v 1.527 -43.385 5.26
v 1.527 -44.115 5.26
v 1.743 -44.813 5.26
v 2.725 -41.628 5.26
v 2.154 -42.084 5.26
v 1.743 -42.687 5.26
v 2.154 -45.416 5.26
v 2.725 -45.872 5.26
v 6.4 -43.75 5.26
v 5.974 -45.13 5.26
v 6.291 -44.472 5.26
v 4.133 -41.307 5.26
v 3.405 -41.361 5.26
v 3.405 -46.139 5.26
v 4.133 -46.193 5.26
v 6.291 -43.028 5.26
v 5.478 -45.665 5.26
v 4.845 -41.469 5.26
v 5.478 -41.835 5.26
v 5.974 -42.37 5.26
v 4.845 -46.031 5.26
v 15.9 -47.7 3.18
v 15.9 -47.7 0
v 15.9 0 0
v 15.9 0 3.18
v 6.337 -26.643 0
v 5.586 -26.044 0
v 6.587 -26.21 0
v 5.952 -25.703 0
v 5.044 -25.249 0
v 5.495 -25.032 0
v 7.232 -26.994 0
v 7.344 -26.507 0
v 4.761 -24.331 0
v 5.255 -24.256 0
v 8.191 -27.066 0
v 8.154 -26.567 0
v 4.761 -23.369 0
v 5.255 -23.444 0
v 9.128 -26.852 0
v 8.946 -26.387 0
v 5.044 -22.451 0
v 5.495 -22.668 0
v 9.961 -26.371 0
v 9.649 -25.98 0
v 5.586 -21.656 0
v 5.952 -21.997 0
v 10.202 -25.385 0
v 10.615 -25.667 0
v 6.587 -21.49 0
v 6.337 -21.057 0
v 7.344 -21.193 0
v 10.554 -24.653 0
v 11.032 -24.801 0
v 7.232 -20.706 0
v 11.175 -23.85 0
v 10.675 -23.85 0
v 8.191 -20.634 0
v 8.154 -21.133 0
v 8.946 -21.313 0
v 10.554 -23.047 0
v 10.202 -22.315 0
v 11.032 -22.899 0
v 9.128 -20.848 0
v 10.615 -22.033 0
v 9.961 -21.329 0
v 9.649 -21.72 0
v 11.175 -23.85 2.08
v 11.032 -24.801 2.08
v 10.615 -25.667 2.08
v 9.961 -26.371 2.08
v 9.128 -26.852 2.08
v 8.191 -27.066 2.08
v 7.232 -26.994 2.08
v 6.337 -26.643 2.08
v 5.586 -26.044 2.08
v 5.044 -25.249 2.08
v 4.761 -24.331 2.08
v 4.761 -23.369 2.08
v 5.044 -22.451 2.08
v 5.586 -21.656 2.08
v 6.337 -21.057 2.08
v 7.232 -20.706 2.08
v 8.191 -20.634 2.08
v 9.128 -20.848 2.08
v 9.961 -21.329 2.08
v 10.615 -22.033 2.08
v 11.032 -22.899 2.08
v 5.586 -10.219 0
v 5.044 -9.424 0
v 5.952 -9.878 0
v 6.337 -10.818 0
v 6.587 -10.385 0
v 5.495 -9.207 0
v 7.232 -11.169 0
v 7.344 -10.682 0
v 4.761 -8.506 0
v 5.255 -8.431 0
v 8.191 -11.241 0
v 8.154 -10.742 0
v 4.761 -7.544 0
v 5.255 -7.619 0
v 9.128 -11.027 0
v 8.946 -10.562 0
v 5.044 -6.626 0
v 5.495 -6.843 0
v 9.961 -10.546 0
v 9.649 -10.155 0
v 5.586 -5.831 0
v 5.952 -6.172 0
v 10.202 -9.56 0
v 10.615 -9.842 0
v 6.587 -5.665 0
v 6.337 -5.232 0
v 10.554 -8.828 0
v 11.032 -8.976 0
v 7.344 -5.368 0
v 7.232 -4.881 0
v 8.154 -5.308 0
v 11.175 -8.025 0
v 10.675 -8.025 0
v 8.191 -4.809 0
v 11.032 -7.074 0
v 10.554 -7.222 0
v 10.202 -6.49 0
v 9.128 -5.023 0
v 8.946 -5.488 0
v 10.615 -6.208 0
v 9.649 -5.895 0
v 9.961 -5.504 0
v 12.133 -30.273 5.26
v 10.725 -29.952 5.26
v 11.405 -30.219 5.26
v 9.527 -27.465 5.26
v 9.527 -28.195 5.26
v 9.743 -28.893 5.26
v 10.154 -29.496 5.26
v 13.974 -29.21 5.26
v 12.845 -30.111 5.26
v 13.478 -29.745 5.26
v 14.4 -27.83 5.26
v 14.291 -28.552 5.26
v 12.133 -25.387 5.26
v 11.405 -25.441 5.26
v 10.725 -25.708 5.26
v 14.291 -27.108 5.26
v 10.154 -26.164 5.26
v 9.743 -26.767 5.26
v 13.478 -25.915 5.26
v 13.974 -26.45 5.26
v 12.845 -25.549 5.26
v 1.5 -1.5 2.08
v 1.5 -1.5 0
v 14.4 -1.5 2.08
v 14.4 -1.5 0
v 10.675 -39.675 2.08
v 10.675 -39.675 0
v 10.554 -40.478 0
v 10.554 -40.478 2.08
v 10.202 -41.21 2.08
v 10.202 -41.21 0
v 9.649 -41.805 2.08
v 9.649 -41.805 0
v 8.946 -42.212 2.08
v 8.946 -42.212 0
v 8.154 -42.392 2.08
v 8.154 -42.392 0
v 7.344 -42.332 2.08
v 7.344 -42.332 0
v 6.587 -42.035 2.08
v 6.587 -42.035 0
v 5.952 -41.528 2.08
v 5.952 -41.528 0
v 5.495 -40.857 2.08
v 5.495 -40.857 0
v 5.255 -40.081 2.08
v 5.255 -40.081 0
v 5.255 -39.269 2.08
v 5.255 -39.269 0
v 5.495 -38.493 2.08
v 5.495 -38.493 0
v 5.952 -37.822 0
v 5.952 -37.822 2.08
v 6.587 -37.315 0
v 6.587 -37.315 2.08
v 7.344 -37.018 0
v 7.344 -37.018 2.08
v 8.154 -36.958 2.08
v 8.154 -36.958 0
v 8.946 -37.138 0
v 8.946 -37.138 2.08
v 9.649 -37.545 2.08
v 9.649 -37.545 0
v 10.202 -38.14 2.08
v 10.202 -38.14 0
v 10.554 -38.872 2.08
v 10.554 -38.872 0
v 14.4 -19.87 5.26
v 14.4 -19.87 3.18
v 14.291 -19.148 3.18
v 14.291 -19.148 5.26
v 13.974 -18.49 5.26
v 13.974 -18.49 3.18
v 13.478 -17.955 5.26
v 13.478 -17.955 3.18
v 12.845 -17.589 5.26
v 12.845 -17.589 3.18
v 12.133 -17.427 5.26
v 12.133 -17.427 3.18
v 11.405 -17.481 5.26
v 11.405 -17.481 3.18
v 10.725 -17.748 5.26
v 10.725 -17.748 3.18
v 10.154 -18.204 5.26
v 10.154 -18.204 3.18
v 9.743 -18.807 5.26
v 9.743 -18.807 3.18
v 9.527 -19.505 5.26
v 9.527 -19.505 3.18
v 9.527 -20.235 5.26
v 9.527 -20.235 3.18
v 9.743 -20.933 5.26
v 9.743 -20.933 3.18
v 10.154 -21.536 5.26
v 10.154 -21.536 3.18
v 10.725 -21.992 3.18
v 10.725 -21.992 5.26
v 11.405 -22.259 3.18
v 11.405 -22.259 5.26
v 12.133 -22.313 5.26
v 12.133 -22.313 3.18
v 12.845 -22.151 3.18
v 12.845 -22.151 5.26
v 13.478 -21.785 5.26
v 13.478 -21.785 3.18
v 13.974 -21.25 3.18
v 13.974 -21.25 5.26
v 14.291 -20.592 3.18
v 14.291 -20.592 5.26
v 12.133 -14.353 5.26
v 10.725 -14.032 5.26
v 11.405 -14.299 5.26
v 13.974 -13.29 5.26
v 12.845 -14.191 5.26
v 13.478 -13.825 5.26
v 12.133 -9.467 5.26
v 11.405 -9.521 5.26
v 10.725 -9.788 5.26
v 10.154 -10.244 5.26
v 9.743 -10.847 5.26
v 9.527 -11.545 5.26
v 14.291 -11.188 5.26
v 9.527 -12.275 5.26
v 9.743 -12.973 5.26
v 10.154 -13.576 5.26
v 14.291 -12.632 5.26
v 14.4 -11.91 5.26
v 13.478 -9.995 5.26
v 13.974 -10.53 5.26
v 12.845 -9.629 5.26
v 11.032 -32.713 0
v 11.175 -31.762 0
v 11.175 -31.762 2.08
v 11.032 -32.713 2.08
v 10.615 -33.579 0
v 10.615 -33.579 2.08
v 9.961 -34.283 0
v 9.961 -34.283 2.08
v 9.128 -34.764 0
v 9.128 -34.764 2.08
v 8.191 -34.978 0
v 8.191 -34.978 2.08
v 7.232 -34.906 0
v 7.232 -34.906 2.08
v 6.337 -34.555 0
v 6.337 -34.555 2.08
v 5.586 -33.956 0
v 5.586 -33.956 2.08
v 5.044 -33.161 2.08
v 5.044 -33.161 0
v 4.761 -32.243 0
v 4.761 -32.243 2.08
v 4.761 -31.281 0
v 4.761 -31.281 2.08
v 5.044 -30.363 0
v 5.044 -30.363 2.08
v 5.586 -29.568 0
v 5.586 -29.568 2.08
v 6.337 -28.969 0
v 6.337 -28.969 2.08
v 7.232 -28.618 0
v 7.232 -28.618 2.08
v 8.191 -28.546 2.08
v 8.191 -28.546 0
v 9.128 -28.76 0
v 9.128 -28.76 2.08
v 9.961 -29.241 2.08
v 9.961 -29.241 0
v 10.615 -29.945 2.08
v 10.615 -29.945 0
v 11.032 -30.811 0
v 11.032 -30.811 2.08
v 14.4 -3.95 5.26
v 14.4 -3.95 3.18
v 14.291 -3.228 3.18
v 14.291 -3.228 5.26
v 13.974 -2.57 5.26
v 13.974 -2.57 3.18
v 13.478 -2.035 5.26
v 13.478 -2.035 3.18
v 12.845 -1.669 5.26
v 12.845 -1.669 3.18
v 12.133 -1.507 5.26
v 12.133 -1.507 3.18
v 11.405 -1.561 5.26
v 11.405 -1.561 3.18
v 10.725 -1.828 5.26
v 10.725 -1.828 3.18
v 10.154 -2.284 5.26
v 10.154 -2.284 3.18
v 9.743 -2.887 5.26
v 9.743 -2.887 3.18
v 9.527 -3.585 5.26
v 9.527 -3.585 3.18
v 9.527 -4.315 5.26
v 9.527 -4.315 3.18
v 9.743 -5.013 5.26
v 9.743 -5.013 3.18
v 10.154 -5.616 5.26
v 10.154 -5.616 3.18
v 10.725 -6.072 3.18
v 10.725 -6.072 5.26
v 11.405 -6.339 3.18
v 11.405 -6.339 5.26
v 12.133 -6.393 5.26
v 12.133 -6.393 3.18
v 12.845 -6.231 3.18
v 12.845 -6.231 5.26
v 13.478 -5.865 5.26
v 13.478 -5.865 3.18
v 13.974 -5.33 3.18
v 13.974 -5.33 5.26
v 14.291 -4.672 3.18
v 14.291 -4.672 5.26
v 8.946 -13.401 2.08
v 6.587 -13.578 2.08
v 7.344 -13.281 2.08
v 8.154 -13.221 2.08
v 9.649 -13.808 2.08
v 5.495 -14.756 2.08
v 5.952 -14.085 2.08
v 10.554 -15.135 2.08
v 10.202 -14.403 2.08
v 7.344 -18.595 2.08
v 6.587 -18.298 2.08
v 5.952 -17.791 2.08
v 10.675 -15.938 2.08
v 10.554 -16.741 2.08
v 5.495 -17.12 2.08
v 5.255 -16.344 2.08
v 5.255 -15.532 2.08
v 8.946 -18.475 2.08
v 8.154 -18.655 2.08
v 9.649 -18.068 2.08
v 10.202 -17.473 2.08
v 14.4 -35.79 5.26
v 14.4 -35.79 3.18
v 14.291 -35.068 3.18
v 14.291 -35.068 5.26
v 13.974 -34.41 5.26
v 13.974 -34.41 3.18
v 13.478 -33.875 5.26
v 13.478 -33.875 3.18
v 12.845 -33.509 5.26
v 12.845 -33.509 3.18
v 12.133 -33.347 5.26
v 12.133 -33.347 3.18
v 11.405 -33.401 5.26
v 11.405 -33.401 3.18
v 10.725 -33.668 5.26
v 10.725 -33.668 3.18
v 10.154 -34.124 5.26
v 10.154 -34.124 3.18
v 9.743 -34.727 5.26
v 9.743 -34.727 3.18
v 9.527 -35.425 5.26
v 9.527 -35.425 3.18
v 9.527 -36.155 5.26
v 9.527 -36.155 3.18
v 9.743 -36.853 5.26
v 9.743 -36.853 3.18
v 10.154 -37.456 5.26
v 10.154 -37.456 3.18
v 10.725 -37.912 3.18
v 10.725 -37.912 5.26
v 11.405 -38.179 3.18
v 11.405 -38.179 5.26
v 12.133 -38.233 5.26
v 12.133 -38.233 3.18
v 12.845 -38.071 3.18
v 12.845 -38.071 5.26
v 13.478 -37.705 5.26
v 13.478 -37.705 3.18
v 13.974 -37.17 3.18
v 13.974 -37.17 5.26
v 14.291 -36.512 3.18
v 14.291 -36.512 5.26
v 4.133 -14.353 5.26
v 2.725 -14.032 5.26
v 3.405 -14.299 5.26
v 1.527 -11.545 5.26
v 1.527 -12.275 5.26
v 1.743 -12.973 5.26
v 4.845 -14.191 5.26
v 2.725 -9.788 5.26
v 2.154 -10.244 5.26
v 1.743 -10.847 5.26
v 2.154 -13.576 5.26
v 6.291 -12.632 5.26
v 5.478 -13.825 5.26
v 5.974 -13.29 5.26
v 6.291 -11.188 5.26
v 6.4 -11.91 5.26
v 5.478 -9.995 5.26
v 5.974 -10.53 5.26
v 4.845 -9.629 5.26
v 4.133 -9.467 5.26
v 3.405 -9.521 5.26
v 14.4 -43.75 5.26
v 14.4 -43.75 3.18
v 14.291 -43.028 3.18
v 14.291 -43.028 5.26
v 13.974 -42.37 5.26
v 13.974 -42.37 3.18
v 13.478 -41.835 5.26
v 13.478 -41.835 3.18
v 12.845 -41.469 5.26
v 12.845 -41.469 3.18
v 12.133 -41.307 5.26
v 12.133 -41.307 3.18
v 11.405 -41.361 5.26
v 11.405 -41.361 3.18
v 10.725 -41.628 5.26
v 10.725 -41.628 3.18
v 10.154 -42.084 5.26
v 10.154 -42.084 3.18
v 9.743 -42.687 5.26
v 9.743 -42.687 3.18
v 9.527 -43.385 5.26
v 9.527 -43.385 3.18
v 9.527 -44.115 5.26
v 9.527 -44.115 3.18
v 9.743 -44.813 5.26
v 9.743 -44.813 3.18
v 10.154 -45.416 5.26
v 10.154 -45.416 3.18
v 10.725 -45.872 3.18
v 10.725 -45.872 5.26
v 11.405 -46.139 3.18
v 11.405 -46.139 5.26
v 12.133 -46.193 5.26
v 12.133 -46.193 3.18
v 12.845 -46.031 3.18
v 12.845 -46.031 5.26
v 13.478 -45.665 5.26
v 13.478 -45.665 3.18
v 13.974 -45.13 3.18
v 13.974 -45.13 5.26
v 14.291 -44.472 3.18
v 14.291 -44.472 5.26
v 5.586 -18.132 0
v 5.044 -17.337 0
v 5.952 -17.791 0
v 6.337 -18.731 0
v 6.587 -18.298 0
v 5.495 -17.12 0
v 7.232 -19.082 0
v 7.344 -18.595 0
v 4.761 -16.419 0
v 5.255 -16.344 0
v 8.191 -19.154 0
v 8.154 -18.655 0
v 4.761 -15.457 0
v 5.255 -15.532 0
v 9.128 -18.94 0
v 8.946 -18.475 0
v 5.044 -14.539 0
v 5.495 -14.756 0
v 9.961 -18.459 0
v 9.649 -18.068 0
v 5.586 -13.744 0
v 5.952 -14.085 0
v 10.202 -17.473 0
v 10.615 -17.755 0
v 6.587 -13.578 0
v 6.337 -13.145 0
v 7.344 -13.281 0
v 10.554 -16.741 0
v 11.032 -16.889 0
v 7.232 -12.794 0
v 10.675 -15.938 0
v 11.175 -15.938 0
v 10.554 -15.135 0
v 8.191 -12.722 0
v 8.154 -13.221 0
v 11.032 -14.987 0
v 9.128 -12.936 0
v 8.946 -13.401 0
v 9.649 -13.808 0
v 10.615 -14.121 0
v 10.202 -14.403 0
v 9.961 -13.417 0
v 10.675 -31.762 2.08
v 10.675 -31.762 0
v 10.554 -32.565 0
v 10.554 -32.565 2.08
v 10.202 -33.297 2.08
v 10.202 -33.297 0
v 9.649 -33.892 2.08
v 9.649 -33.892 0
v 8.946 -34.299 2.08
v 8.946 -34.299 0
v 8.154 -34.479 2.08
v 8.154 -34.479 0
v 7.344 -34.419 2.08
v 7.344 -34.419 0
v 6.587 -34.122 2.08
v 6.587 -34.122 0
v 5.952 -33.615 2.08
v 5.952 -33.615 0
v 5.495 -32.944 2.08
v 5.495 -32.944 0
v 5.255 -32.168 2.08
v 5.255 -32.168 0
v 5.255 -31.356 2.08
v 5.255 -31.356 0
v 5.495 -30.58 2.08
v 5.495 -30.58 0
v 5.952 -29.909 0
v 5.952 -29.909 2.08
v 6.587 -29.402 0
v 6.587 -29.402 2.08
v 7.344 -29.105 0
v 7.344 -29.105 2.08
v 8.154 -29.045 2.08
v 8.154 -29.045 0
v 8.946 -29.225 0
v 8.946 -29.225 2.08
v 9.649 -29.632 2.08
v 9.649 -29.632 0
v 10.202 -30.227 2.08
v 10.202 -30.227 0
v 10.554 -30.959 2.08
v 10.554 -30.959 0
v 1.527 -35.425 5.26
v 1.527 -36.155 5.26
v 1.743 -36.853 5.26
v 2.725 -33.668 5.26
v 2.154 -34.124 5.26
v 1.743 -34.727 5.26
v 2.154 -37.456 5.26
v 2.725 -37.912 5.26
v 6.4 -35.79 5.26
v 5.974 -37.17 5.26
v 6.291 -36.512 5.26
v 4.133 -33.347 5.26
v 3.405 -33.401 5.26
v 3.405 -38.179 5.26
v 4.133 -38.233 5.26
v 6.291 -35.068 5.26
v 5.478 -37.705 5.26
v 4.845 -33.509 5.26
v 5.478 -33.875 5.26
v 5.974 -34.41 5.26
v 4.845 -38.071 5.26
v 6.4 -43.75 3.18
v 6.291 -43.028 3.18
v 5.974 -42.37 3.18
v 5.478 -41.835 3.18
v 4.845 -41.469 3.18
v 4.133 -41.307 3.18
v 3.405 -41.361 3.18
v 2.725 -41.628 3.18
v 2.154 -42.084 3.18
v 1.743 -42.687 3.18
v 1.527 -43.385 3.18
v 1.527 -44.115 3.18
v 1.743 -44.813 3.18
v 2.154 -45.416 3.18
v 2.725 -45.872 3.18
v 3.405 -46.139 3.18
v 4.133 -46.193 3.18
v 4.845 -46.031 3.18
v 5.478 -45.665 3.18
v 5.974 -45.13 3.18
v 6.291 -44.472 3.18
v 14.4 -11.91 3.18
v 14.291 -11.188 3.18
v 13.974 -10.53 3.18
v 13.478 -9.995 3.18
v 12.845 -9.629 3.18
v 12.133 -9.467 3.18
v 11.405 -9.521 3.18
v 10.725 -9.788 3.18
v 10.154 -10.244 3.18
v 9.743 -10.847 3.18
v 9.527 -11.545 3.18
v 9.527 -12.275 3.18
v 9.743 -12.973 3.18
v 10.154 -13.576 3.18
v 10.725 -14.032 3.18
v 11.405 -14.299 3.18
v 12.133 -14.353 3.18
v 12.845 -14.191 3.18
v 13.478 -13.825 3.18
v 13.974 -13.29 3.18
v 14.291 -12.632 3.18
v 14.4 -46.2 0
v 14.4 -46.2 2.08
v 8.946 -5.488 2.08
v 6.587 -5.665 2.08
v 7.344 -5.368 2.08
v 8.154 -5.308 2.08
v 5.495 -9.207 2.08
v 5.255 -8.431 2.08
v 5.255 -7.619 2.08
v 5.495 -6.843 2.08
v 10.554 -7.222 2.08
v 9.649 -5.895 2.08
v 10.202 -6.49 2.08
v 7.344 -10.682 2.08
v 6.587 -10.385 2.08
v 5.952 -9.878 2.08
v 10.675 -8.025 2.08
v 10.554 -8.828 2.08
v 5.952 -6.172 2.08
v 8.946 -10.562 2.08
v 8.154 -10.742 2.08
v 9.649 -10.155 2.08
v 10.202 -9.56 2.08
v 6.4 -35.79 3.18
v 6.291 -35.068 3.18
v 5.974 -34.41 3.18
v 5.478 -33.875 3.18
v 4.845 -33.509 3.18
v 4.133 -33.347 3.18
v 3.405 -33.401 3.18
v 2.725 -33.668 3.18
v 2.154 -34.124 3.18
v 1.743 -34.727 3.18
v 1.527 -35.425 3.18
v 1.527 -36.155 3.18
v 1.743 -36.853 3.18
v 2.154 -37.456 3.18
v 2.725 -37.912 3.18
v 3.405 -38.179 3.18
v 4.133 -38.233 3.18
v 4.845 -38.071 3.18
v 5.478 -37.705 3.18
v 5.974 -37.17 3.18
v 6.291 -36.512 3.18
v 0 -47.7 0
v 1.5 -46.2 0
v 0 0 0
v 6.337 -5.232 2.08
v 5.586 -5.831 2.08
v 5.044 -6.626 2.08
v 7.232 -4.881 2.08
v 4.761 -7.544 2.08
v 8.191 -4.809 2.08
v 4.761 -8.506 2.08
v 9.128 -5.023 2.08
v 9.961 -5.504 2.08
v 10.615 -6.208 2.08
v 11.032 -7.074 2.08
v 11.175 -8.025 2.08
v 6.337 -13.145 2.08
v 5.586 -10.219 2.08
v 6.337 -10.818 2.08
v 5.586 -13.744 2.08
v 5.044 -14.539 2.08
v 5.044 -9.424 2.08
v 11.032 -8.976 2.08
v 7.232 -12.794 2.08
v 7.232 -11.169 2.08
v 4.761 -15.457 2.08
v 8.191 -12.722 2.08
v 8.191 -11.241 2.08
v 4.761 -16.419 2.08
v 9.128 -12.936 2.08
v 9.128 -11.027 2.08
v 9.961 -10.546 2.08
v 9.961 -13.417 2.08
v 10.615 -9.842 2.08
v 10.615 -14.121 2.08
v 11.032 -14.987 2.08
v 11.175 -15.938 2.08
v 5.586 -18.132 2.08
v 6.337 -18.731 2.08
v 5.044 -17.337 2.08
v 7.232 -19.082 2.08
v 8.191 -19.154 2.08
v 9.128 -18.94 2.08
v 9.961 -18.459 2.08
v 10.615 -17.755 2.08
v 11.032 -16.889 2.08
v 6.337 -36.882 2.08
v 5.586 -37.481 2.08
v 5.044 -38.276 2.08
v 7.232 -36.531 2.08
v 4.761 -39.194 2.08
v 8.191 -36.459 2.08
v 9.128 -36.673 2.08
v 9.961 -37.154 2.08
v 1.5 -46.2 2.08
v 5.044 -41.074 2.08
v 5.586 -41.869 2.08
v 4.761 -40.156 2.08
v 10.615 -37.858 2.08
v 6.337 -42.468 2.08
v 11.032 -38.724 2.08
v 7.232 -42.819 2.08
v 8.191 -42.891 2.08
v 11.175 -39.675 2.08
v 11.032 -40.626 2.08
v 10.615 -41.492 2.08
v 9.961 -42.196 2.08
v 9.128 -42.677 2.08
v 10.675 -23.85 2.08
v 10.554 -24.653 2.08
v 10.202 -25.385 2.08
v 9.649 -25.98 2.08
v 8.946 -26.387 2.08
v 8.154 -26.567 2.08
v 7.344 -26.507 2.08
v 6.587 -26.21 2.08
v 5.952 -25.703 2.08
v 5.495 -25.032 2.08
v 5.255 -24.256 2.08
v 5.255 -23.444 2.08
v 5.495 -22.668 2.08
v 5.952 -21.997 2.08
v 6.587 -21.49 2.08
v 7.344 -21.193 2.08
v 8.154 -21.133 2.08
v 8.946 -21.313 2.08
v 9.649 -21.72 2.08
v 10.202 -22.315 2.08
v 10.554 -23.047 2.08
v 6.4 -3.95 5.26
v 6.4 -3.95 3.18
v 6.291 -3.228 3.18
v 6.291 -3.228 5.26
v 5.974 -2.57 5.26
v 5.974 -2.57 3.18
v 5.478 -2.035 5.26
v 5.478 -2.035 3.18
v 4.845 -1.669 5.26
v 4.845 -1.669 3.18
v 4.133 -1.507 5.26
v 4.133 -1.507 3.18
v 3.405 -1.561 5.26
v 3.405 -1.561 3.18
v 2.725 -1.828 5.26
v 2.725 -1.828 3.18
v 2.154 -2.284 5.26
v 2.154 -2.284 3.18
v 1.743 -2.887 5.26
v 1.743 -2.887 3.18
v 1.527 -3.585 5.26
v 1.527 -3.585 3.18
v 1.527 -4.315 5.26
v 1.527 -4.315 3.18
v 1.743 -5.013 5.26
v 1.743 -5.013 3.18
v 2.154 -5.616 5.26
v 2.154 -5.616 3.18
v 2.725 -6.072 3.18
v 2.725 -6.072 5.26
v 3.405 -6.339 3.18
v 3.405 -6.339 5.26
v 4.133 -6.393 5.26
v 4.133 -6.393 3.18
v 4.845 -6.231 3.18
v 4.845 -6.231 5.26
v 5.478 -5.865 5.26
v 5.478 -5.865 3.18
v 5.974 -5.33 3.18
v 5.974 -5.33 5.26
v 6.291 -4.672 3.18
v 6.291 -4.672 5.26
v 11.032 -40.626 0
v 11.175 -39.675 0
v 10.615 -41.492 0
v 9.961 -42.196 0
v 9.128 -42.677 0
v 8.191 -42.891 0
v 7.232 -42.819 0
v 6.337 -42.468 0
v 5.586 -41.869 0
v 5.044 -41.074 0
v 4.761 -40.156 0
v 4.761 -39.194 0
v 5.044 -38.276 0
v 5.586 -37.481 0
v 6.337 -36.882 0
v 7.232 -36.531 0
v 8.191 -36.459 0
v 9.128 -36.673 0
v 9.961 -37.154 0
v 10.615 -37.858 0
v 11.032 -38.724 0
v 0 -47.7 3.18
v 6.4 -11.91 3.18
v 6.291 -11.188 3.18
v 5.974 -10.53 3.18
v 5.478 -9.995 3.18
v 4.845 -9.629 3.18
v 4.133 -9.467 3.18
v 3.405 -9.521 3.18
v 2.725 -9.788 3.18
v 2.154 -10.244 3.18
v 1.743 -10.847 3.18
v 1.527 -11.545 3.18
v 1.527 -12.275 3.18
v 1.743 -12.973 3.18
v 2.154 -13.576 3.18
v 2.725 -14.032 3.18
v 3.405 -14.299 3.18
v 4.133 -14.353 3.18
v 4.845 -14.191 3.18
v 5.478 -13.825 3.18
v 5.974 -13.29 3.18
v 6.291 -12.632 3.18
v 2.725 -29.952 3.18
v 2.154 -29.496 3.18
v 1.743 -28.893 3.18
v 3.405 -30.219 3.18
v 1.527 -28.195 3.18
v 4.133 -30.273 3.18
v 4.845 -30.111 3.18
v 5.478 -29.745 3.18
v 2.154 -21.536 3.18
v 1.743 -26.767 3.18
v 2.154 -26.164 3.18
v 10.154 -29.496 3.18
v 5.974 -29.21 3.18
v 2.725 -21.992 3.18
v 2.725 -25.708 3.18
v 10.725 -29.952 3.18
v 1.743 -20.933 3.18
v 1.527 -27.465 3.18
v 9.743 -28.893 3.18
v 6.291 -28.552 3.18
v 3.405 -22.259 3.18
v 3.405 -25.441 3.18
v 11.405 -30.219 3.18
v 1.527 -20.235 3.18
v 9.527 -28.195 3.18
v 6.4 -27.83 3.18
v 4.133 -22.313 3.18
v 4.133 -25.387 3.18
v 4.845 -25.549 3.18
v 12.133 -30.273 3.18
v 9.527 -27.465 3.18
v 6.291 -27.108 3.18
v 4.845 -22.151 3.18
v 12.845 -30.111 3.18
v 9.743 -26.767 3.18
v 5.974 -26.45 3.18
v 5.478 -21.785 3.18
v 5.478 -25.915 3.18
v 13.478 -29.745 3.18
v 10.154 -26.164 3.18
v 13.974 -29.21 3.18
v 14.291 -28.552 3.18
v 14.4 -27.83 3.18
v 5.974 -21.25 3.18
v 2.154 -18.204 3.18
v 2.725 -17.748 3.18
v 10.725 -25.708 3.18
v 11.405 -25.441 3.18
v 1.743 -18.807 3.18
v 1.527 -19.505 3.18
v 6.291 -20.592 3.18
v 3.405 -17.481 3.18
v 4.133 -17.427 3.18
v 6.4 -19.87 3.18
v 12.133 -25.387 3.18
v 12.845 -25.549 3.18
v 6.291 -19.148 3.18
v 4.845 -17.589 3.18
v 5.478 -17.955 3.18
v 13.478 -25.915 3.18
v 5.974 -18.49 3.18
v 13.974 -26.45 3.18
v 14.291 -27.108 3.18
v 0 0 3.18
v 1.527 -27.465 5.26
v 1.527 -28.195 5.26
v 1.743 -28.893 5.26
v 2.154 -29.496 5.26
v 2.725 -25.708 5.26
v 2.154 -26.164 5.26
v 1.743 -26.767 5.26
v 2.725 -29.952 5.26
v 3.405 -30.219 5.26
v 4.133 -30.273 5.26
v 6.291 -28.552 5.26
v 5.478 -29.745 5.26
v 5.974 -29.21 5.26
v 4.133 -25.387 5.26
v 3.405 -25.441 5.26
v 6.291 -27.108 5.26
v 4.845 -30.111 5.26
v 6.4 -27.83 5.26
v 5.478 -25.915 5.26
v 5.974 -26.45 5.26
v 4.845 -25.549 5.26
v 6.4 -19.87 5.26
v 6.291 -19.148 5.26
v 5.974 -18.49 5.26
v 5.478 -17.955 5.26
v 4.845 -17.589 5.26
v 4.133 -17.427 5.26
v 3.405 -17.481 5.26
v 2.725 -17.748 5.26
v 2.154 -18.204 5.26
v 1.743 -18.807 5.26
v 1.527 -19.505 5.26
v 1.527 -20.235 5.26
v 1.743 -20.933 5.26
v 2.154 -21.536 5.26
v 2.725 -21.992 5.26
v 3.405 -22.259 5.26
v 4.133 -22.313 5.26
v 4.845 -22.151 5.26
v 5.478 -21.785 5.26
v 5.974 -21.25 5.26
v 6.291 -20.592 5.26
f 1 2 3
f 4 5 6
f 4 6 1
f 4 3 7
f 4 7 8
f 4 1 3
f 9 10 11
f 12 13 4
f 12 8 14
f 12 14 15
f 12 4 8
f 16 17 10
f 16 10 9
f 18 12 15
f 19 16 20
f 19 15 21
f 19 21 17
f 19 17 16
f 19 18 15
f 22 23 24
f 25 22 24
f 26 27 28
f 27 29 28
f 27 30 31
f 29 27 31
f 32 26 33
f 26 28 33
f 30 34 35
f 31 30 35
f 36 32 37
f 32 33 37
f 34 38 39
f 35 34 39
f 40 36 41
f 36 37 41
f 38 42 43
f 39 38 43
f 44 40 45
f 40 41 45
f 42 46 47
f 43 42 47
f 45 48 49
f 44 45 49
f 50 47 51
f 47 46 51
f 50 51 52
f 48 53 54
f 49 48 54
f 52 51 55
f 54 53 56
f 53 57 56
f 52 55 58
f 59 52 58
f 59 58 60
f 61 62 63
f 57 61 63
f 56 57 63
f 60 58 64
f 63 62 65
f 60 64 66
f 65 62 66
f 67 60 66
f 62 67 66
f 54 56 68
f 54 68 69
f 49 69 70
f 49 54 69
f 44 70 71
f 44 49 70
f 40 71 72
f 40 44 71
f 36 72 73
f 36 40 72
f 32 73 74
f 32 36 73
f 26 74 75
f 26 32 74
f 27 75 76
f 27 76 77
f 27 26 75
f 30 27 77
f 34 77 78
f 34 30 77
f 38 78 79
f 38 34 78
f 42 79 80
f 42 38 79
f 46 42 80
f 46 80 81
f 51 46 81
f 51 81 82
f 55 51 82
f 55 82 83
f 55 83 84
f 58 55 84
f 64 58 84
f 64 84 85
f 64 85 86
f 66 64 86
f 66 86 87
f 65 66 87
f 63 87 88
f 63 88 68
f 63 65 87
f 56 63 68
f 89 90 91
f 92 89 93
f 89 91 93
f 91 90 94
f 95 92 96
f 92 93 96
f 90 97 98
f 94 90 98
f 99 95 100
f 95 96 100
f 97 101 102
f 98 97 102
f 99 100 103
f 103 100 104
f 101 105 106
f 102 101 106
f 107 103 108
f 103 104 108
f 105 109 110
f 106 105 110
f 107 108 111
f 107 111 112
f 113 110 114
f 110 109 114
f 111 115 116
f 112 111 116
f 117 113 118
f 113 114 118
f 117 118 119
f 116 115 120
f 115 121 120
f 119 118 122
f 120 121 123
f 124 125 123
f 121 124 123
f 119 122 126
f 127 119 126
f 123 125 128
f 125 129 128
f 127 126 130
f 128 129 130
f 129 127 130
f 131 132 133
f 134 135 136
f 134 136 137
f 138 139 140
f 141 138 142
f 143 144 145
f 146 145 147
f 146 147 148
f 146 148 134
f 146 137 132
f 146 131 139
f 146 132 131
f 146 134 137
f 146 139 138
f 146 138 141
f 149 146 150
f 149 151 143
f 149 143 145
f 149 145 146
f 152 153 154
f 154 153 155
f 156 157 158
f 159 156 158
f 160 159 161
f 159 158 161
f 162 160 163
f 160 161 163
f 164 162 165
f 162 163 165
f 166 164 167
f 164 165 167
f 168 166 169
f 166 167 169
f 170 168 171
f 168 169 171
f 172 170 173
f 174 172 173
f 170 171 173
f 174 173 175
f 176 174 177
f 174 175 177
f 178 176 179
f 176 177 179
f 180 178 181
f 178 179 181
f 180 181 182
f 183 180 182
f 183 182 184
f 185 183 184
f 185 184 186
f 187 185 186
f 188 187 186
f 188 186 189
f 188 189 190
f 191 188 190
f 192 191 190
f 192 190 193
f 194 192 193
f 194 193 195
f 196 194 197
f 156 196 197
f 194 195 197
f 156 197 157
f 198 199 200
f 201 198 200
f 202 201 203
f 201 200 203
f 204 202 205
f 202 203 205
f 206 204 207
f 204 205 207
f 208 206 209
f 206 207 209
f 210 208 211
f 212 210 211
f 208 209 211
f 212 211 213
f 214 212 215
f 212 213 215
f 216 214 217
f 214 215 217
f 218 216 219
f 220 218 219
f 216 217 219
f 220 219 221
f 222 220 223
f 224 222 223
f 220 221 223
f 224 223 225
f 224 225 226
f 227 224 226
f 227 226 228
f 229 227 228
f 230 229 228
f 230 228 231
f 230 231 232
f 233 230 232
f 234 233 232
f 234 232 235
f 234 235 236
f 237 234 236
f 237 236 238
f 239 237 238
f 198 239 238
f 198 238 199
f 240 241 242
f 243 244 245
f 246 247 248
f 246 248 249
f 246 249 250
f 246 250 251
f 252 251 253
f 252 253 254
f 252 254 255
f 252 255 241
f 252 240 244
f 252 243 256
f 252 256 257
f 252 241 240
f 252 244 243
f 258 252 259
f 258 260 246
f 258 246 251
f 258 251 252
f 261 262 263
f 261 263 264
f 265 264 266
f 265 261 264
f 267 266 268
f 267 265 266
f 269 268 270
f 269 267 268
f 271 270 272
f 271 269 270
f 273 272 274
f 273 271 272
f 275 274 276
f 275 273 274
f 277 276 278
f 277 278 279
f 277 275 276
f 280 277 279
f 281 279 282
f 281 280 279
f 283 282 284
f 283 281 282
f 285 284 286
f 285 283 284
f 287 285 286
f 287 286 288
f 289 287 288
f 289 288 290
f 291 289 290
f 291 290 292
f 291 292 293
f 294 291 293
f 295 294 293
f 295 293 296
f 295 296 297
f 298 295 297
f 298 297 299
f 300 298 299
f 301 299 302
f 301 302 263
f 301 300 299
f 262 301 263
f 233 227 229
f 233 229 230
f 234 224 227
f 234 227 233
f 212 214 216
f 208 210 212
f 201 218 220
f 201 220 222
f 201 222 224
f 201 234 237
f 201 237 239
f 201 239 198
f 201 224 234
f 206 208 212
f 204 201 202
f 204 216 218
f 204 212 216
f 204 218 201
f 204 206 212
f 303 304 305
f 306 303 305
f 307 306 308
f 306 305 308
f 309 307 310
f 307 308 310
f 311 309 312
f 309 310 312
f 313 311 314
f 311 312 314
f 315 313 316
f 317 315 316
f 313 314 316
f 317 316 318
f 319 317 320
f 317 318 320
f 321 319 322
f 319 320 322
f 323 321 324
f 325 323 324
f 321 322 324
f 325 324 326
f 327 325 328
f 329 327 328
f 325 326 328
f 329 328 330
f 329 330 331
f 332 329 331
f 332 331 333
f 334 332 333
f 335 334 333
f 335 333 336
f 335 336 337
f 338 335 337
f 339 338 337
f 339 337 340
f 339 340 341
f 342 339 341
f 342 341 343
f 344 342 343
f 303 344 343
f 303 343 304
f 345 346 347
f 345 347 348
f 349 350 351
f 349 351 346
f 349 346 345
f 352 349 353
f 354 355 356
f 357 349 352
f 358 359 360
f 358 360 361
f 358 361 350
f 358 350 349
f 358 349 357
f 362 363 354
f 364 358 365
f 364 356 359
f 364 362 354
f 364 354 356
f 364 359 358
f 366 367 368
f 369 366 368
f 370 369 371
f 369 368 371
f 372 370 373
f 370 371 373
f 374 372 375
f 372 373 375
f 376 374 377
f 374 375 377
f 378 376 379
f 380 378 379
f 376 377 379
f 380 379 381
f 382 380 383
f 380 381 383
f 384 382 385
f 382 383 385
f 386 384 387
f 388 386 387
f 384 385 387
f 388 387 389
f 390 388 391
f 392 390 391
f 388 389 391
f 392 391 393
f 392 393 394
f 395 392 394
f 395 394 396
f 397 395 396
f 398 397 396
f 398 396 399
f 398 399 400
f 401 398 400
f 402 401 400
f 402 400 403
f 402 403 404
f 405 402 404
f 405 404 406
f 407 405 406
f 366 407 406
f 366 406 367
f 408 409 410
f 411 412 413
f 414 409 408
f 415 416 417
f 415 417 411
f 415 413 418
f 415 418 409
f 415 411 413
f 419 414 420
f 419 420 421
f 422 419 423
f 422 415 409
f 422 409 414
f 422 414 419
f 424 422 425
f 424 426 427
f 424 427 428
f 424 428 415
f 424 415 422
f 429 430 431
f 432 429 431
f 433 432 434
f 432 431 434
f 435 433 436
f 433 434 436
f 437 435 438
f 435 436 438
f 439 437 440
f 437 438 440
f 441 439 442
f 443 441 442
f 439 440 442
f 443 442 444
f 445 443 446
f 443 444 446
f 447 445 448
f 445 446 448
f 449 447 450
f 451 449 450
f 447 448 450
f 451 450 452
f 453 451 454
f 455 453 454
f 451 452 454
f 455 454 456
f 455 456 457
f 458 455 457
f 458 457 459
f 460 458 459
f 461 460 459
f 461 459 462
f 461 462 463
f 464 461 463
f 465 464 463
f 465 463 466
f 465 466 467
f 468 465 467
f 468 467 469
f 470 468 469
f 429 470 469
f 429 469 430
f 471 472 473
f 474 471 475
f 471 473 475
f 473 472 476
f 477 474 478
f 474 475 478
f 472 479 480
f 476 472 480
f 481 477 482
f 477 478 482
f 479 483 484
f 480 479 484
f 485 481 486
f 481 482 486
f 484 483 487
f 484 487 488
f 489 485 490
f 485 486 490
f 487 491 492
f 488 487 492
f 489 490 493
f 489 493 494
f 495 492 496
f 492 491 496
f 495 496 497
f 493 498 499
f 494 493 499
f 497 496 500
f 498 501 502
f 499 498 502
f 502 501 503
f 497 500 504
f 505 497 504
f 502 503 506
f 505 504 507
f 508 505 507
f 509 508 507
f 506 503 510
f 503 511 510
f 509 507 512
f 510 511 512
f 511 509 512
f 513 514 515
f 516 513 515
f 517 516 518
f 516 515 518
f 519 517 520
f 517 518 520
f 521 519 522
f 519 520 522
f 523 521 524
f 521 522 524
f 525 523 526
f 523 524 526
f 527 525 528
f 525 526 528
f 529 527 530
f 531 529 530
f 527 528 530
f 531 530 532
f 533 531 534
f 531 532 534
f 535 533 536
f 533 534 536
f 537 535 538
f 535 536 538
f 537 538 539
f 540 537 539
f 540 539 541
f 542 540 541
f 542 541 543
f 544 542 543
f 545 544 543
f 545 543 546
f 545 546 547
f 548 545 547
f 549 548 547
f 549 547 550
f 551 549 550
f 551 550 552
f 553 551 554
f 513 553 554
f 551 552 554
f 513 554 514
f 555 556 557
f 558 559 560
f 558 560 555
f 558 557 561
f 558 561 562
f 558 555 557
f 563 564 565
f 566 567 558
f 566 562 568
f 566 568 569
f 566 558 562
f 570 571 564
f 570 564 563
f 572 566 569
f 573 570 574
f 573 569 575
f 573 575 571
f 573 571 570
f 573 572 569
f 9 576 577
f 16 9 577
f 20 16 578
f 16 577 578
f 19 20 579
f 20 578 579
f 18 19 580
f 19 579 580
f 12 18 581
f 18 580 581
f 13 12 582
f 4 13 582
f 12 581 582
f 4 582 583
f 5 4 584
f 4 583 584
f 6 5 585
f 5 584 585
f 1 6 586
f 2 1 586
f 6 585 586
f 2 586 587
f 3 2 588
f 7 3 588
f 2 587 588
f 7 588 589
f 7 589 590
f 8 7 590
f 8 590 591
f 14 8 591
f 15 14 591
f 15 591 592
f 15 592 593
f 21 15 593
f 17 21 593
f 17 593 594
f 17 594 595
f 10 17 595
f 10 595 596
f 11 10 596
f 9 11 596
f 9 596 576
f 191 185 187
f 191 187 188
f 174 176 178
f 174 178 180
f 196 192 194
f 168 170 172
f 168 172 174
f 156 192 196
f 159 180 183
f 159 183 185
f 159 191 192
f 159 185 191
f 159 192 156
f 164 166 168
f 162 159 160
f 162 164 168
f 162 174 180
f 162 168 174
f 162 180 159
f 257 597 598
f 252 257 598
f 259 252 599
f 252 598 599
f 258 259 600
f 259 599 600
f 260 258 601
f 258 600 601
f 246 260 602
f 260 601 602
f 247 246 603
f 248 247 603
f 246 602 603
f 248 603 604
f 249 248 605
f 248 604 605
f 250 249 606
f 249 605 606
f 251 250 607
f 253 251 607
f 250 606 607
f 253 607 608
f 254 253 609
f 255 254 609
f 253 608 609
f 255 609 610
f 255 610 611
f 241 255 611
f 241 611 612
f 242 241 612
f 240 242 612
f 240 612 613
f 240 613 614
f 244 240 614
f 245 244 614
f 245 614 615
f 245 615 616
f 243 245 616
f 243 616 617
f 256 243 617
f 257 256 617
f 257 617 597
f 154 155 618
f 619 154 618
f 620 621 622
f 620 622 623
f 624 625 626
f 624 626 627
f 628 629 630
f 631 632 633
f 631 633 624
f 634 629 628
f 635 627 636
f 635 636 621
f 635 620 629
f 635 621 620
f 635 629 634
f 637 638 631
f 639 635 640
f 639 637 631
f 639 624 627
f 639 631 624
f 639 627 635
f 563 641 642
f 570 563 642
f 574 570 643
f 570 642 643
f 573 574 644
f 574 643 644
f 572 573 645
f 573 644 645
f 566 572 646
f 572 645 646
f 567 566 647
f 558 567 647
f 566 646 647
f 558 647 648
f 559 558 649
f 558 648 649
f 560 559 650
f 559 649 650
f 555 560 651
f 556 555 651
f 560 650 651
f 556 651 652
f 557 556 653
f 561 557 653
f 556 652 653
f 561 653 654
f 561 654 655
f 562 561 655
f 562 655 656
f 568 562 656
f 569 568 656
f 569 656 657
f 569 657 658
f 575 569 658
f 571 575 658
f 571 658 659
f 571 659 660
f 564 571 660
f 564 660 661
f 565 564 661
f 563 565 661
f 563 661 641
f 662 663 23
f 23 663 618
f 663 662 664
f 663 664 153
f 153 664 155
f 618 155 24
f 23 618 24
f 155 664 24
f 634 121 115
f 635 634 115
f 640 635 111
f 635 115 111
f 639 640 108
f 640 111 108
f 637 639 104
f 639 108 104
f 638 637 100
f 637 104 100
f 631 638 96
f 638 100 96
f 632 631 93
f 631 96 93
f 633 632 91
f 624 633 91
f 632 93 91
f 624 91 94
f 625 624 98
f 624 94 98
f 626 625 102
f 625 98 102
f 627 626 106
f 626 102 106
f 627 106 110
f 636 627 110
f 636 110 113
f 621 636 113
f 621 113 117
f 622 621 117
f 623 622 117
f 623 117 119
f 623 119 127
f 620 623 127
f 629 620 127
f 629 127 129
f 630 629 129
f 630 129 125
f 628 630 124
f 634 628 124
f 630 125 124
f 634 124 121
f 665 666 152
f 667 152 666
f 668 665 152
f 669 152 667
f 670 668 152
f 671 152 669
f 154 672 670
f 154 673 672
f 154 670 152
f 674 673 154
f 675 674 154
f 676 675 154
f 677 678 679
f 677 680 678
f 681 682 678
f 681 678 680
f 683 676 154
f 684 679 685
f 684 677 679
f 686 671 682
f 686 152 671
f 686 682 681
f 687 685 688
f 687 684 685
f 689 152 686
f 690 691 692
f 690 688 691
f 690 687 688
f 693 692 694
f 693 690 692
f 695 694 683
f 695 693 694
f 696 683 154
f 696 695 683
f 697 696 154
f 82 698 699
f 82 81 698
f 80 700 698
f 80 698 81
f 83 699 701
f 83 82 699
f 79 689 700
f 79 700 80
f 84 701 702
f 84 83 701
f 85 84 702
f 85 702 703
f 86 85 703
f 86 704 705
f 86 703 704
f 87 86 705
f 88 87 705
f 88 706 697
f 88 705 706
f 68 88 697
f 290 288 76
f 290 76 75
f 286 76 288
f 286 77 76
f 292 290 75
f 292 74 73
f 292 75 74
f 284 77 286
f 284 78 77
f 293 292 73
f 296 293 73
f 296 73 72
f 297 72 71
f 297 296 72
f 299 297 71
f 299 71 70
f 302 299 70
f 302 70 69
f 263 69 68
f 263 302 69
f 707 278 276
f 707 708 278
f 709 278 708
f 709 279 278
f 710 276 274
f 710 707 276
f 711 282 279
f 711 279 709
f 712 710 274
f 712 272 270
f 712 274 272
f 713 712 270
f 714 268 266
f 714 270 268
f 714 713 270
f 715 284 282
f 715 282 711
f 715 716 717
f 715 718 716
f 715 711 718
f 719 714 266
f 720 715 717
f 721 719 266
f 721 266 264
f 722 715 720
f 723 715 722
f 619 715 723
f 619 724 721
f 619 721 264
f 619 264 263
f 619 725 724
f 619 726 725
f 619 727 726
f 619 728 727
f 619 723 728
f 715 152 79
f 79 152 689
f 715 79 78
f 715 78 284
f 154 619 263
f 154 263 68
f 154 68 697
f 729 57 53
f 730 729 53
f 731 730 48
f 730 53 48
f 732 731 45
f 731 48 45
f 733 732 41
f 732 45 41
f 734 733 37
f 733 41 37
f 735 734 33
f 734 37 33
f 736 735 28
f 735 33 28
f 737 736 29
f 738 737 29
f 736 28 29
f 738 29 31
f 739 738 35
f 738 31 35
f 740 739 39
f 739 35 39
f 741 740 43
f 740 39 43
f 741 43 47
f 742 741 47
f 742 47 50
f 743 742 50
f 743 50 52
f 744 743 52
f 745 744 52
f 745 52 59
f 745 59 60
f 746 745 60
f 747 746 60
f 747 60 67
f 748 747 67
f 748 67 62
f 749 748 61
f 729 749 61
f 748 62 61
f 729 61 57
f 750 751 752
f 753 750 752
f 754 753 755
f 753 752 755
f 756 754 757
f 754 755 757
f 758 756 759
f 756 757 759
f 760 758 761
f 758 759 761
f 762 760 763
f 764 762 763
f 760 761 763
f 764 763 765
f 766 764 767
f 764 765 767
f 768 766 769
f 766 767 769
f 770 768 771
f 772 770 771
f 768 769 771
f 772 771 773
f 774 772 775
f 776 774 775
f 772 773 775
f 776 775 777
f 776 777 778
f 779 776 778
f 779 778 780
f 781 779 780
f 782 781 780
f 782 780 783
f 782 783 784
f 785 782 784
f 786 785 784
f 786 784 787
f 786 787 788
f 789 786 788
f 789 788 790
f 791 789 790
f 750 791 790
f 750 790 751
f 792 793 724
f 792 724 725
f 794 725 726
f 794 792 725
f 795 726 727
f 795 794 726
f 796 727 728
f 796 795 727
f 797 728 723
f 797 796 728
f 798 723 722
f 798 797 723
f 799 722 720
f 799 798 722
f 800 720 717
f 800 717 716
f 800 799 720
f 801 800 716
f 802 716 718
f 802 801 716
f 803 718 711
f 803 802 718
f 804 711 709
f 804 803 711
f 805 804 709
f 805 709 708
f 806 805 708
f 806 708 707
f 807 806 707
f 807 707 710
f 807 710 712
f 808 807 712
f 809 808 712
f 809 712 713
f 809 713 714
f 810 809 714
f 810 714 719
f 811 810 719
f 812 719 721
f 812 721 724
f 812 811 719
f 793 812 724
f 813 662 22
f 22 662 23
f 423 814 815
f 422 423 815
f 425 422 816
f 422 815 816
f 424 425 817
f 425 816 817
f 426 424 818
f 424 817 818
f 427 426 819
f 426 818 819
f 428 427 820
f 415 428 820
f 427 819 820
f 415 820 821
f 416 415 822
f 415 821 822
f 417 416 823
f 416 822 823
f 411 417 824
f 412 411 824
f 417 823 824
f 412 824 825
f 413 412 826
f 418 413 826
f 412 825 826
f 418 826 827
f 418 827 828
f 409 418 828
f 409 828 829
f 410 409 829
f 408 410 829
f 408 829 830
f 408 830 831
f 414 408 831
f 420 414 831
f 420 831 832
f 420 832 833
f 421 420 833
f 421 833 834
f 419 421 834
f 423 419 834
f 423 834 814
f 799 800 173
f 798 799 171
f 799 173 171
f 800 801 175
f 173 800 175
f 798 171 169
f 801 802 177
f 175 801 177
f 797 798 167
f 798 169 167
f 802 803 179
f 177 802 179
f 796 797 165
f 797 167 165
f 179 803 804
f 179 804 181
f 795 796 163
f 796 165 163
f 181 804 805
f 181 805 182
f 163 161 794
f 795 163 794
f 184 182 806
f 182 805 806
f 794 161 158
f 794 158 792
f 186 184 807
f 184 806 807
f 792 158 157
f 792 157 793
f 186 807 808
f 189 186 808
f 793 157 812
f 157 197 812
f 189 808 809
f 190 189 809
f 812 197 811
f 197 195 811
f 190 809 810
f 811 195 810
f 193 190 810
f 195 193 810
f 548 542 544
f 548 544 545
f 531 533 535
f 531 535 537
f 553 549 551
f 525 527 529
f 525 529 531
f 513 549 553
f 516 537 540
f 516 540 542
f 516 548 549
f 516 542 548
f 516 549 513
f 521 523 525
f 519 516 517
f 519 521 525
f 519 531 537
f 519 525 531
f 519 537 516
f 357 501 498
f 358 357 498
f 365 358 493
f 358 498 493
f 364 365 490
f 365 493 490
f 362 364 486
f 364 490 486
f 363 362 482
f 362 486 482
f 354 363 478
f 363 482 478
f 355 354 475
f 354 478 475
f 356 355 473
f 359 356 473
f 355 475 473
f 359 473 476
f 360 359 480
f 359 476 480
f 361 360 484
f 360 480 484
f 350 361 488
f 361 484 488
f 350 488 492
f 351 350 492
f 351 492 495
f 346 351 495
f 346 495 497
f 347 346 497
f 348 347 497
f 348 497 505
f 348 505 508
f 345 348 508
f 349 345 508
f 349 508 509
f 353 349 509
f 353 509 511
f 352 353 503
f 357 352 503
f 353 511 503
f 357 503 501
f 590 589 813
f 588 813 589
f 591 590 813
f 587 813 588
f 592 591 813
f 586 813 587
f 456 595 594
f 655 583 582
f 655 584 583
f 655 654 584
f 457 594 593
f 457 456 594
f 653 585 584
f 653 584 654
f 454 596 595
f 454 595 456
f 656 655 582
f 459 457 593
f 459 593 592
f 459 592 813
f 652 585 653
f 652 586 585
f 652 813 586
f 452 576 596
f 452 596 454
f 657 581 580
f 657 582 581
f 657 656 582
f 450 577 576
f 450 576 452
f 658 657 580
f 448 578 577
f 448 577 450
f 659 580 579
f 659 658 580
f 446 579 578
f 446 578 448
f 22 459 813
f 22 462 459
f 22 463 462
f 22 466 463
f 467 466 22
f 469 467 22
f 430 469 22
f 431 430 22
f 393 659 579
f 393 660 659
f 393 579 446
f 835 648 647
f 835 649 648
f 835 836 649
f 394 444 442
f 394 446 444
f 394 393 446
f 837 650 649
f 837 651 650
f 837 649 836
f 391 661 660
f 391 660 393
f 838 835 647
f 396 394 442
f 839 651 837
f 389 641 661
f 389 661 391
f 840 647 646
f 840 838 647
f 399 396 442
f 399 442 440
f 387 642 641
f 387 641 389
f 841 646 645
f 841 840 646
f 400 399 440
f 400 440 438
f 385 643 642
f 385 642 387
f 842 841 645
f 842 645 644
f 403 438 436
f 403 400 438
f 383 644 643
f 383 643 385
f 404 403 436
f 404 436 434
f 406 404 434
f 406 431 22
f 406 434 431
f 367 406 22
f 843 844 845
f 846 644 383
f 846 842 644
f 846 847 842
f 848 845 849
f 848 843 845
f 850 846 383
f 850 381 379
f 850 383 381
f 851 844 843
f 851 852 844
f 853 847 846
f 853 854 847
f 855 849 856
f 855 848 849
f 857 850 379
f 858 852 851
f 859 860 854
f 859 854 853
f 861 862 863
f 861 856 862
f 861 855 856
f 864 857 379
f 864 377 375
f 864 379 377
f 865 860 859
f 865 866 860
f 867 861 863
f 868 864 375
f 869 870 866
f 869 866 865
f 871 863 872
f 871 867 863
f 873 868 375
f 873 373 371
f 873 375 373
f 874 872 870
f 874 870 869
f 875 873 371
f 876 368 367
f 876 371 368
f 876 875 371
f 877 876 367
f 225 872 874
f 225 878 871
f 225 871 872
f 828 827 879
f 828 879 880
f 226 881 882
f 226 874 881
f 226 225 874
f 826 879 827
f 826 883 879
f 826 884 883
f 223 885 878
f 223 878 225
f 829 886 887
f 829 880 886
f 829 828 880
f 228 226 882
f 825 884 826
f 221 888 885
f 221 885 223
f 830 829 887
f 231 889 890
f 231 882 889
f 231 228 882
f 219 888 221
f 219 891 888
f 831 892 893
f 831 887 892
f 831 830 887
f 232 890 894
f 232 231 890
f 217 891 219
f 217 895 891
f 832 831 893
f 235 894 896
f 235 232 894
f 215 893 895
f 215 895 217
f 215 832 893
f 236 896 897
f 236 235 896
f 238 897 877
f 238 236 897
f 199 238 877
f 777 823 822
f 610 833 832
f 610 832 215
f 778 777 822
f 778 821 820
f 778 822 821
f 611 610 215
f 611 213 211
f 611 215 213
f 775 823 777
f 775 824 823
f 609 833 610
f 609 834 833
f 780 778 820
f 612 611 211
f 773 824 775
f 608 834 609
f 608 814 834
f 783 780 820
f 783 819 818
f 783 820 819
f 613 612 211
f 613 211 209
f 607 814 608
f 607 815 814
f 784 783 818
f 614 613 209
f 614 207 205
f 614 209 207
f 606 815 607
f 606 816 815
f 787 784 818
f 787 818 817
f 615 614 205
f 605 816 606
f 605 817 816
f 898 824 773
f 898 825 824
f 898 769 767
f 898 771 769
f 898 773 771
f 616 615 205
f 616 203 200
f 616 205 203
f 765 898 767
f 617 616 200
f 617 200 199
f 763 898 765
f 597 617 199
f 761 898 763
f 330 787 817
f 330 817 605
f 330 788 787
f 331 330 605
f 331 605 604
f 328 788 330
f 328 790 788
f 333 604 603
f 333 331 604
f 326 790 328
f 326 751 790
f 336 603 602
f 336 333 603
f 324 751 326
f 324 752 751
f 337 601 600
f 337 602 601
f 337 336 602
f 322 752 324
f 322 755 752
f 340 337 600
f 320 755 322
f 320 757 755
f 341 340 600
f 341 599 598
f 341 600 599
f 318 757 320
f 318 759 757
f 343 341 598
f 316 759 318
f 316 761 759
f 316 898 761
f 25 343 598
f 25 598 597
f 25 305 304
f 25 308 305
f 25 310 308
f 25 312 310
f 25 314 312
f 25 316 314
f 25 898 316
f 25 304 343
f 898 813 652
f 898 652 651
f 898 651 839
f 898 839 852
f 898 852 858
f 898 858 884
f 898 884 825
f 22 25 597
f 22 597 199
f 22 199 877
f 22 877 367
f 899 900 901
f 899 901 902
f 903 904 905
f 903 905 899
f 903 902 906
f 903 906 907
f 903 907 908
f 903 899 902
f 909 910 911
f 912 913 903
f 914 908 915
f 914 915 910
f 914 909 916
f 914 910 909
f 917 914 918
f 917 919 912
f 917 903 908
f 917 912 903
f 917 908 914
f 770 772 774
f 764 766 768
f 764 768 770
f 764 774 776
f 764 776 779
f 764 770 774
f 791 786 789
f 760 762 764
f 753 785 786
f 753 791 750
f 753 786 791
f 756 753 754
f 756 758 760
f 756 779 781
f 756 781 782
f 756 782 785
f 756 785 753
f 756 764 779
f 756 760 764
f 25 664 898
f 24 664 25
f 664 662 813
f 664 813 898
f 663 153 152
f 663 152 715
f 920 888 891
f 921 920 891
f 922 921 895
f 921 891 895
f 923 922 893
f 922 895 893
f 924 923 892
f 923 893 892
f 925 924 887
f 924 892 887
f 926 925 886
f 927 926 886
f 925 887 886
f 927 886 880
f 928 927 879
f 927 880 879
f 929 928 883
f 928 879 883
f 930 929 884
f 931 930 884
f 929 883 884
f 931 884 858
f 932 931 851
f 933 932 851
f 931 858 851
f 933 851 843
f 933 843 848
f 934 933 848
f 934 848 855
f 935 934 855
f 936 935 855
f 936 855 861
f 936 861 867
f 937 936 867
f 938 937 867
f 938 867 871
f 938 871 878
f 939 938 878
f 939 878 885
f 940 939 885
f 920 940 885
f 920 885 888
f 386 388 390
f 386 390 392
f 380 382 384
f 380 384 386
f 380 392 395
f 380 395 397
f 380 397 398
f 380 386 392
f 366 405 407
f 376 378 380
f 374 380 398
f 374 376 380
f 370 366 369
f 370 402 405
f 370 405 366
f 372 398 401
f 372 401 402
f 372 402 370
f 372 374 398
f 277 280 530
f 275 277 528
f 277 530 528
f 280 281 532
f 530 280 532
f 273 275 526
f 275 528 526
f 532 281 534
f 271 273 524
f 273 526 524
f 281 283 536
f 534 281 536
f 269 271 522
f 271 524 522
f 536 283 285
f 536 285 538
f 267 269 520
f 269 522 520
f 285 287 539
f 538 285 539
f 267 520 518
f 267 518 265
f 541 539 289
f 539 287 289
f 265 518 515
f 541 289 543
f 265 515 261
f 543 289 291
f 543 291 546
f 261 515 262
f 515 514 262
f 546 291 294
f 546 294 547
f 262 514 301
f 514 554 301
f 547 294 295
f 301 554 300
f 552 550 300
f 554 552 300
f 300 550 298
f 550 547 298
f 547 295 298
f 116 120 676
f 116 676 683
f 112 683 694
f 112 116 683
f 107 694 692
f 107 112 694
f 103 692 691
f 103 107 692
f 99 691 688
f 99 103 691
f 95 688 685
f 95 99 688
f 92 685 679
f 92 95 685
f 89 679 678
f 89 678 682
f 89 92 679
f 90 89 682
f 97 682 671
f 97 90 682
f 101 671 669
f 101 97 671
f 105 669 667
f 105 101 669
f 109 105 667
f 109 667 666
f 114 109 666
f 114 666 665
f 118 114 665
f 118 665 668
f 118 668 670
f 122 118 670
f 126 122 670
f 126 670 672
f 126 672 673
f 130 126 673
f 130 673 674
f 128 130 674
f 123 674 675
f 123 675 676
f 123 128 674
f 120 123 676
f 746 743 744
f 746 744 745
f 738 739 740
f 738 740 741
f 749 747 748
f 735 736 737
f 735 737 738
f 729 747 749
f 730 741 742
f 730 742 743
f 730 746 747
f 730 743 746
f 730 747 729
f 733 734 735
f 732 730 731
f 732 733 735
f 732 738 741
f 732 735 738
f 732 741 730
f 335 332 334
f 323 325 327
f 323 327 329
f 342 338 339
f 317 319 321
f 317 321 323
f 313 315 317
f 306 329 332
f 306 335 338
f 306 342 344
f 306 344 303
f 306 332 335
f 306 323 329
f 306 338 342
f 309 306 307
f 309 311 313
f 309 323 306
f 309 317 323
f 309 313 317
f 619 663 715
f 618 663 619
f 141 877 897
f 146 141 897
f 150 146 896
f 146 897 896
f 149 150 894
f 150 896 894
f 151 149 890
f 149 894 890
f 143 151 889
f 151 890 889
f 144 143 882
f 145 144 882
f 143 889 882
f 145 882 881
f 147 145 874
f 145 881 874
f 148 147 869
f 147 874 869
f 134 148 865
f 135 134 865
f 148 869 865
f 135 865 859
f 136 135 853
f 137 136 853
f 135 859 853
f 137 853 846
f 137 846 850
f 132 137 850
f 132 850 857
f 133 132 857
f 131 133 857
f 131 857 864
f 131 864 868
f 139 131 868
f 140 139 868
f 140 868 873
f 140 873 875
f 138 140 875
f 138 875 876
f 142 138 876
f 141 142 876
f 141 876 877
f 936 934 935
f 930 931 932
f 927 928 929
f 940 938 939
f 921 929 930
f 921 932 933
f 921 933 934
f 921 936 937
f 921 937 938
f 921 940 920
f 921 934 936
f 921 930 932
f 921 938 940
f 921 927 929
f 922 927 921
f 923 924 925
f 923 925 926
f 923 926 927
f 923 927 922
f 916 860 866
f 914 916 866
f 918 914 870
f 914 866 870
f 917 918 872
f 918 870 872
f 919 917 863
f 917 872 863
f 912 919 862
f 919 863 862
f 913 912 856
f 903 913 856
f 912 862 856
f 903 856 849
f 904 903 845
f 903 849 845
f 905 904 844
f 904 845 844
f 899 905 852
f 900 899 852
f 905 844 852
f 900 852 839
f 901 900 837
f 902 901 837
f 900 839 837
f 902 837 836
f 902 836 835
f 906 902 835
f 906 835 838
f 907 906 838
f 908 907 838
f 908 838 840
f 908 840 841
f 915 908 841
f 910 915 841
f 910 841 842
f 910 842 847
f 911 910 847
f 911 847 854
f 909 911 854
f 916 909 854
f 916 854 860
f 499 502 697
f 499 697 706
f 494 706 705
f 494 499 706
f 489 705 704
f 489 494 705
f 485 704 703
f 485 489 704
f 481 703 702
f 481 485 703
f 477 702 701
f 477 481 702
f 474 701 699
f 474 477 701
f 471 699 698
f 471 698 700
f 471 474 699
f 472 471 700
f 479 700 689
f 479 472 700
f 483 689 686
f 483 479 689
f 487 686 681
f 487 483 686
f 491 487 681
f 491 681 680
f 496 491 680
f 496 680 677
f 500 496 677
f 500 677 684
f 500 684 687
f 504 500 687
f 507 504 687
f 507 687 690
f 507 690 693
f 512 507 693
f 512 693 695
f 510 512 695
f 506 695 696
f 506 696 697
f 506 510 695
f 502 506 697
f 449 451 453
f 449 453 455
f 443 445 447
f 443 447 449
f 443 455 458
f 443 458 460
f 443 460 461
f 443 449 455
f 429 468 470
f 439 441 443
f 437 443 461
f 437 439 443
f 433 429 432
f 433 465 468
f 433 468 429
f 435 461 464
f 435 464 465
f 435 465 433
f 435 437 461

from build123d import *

# Parameters (mm, degrees)
F0_W     = 15.9
F0_H     = 47.7
F0_R     = 2.45
F1_DEPTH = 3.18
F2_DEPTH = 5.26
F3_W     = 12.9
F3_H     = 44.7
F3_R     = 3.225
F3_R_2   = 2.725
F4_DEPTH = 2.08


with BuildPart() as f1:
    # F0 (on Top) → F1 (new body)
    with BuildSketch(Plane.XY):
        with Locations((7.95, -23.85)):
            Rectangle(F0_W, F0_H)
        with Locations((3.95, -43.75)):
            Circle(F0_R, mode=Mode.SUBTRACT)
        with Locations((3.95, -35.79)):
            Circle(F0_R, mode=Mode.SUBTRACT)
        with Locations((3.95, -27.83)):
            Circle(F0_R, mode=Mode.SUBTRACT)
        with Locations((11.95, -43.75)):
            Circle(F0_R, mode=Mode.SUBTRACT)
        with Locations((11.95, -35.79)):
            Circle(F0_R, mode=Mode.SUBTRACT)
        with Locations((11.95, -27.83)):
            Circle(F0_R, mode=Mode.SUBTRACT)
        with Locations((3.95, -19.87)):
            Circle(F0_R, mode=Mode.SUBTRACT)
        with Locations((3.95, -11.91)):
            Circle(F0_R, mode=Mode.SUBTRACT)
        with Locations((3.95, -3.95)):
            Circle(F0_R, mode=Mode.SUBTRACT)
        with Locations((11.95, -19.87)):
            Circle(F0_R, mode=Mode.SUBTRACT)
        with Locations((11.95, -11.91)):
            Circle(F0_R, mode=Mode.SUBTRACT)
        with Locations((11.95, -3.95)):
            Circle(F0_R, mode=Mode.SUBTRACT)
    extrude(amount=F1_DEPTH)

    # F0 (on Top) → F2 (join)
    with BuildSketch(Plane.XY):
        with Locations((3.95, -3.95)):
            Circle(F0_R)
        with Locations((11.95, -3.95)):
            Circle(F0_R)
        with Locations((11.95, -11.91)):
            Circle(F0_R)
        with Locations((3.95, -11.91)):
            Circle(F0_R)
        with Locations((3.95, -19.87)):
            Circle(F0_R)
        with Locations((11.95, -19.87)):
            Circle(F0_R)
        with Locations((11.95, -27.83)):
            Circle(F0_R)
        with Locations((3.95, -27.83)):
            Circle(F0_R)
        with Locations((3.95, -35.79)):
            Circle(F0_R)
        with Locations((11.95, -35.79)):
            Circle(F0_R)
        with Locations((11.95, -43.75)):
            Circle(F0_R)
        with Locations((3.95, -43.75)):
            Circle(F0_R)
    extrude(amount=F2_DEPTH)

    # F3 (on face) → F4 (cut)
    with BuildSketch(Plane(origin=(0, 0, 0), x_dir=(1, 0, 0), z_dir=(0, 0, -1))):
        with Locations((7.95, 23.85)):
            Rectangle(F3_W, F3_H)
        with Locations((7.95, 8.025)):
            Circle(F3_R, mode=Mode.SUBTRACT)
        with Locations((7.95, 15.938)):
            Circle(F3_R, mode=Mode.SUBTRACT)
        with Locations((7.95, 23.85)):
            Circle(F3_R, mode=Mode.SUBTRACT)
        with Locations((7.95, 31.762)):
            Circle(F3_R, mode=Mode.SUBTRACT)
        with Locations((7.95, 39.675)):
            Circle(F3_R, mode=Mode.SUBTRACT)
        with Locations((7.95, 39.675)):
            Circle(F3_R_2)
        with Locations((7.95, 31.762)):
            Circle(F3_R_2)
        with Locations((7.95, 23.85)):
            Circle(F3_R_2)
        with Locations((7.95, 15.938)):
            Circle(F3_R_2)
        with Locations((7.95, 8.025)):
            Circle(F3_R_2)
    extrude(amount=-F4_DEPTH, mode=Mode.SUBTRACT)


solid = f1.part
